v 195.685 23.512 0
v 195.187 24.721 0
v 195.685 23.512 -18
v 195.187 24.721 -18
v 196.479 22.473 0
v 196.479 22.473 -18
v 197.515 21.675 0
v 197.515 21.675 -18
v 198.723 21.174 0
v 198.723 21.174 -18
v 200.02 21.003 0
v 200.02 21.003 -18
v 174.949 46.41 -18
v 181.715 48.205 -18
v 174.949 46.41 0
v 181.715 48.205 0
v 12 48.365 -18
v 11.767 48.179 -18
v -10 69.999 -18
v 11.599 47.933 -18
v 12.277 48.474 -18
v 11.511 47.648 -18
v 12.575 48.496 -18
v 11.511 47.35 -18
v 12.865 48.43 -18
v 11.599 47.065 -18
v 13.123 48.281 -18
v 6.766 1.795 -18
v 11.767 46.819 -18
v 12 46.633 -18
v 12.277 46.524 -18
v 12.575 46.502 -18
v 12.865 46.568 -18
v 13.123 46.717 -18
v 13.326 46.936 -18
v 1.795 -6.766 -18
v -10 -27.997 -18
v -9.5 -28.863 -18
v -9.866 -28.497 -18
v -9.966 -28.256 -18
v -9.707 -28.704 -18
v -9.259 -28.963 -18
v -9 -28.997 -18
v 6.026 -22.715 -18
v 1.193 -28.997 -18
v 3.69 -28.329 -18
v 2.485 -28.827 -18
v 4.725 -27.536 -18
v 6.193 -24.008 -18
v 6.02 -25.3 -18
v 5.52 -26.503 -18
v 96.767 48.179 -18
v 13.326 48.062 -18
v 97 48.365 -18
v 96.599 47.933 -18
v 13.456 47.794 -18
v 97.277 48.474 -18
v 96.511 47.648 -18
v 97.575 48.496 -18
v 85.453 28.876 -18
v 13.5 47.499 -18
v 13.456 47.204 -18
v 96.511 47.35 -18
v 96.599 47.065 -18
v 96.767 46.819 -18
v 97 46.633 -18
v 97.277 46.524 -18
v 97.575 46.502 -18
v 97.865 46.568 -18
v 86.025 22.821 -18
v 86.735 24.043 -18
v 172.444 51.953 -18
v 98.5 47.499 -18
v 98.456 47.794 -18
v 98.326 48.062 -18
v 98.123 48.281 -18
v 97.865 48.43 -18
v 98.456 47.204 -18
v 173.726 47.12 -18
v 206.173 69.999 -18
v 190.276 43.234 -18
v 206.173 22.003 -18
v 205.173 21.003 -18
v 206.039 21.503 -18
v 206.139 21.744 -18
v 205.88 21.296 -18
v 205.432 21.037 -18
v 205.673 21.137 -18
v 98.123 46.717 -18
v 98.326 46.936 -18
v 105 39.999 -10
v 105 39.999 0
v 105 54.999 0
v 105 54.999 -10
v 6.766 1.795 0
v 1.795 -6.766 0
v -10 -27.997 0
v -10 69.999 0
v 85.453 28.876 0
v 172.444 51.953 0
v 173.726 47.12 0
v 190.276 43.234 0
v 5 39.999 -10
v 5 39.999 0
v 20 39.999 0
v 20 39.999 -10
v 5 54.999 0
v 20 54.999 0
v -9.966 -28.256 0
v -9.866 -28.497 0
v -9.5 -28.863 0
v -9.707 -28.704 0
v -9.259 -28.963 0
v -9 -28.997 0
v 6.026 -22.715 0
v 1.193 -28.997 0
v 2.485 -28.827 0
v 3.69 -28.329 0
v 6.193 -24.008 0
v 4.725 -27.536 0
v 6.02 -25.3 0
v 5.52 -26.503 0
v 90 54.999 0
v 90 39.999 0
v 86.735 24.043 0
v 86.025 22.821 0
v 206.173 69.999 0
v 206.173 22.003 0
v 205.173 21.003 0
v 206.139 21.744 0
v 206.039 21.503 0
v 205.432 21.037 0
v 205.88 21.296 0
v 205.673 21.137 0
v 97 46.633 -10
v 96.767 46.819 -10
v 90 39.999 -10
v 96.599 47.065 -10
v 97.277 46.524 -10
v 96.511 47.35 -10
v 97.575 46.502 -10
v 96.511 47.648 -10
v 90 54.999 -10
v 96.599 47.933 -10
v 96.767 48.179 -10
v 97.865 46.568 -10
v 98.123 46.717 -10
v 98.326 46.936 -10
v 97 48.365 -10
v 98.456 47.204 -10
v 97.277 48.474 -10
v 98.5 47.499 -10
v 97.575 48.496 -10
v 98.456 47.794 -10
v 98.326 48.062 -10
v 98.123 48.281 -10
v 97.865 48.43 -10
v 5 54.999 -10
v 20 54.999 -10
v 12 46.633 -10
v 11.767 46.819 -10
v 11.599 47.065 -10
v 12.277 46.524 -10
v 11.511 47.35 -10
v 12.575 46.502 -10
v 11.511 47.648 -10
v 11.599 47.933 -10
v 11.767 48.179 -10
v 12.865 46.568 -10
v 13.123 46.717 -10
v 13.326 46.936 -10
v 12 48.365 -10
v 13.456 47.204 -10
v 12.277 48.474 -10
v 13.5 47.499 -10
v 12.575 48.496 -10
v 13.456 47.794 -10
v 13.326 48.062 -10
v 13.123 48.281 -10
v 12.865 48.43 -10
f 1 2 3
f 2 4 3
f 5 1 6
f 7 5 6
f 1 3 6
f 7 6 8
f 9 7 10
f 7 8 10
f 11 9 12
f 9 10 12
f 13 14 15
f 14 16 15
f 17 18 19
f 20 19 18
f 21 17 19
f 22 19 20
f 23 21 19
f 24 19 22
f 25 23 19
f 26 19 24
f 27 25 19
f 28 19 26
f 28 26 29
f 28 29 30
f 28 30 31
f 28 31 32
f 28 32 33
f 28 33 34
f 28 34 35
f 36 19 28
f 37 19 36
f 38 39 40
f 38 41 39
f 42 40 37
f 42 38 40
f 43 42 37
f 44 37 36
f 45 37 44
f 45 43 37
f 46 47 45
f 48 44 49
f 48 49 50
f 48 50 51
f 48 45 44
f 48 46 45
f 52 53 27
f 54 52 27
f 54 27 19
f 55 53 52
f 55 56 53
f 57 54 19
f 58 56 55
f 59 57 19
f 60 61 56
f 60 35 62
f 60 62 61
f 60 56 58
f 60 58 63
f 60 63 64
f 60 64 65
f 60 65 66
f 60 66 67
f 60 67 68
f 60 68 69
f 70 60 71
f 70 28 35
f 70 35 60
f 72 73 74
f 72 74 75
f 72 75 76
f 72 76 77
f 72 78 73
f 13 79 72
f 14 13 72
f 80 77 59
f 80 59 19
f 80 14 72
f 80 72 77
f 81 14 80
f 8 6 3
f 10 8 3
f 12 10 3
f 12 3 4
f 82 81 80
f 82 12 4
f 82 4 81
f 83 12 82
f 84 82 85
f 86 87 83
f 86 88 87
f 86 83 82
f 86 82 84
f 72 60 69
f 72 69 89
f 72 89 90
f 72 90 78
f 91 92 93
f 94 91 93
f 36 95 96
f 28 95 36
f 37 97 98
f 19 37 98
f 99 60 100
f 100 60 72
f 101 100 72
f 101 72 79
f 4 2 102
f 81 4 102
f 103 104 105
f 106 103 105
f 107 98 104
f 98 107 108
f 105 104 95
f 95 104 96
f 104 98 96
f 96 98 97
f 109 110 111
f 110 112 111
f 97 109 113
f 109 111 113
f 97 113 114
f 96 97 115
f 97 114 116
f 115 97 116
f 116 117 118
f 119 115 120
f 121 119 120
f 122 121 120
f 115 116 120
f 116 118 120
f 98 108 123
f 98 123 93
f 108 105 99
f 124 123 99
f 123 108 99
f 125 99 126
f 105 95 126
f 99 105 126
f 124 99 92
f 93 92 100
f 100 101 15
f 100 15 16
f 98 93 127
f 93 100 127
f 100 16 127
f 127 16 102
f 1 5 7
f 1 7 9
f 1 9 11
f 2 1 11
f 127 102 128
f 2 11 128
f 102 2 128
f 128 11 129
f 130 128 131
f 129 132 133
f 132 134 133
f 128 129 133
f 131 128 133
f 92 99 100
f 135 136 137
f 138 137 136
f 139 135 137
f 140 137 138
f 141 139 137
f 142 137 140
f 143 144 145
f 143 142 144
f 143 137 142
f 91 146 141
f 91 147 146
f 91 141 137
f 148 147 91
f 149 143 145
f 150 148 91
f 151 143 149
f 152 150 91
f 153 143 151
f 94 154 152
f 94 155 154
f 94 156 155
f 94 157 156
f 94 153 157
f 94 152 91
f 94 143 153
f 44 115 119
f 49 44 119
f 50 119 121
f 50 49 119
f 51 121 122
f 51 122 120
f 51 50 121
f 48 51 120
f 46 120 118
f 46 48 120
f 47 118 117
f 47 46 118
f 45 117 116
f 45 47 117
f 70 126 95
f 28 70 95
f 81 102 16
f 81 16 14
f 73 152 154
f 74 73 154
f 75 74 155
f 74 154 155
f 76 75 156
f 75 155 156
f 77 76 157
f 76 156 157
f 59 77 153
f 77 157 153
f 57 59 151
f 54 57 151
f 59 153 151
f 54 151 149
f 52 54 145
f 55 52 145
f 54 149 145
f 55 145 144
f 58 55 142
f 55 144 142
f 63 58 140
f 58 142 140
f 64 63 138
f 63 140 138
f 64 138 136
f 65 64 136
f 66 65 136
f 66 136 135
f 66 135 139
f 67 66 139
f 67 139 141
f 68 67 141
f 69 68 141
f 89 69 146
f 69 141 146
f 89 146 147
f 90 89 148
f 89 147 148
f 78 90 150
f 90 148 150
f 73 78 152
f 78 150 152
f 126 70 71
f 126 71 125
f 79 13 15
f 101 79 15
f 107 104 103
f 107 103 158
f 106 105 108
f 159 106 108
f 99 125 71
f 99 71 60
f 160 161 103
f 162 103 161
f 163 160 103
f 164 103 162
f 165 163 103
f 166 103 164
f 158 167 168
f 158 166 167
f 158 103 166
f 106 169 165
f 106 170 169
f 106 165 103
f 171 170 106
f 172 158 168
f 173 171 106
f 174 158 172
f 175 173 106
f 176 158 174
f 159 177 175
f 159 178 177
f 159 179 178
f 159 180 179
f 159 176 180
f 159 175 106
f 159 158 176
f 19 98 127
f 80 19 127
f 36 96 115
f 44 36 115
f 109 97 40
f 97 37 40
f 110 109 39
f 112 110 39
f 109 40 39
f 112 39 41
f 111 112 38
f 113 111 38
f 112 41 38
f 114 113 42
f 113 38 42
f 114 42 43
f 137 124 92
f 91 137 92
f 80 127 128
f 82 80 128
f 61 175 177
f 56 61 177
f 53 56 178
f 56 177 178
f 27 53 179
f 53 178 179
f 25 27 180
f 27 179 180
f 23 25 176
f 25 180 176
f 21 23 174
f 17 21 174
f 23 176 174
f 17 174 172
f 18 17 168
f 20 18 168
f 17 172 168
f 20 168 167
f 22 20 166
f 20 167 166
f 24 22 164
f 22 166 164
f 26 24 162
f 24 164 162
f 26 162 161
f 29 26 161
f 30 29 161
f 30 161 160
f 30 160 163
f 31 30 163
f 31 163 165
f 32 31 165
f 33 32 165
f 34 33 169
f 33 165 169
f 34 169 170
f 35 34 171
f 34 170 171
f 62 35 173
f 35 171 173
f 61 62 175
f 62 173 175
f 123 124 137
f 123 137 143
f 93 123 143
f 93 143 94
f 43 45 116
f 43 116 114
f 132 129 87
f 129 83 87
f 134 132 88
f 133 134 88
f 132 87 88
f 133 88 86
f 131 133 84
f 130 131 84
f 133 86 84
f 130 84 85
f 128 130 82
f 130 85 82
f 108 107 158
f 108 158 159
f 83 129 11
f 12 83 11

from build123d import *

# Parameters (mm, degrees)
PAD_DEPTH       = 18
FILLET_R        = 5
FILLET001_R     = 5
FILLET002_R     = 1
FILLET003_R     = 1
CHAMFER_SIZE    = 7
CHAMFER001_SIZE = 7
SKETCH001_W     = 15
SKETCH001_H     = 15
POCKET_DEPTH    = 10
SKETCH005_R     = 1
POCKET001_DEPTH = 8
SKETCH006_R     = 1
POCKET002_DEPTH = 8
POCKET003_DEPTH = 18
CHAMFER002_SIZE = 1
CHAMFER003_SIZE = 1


with BuildPart() as part:
    # Sketch → Pad (new body)
    with BuildSketch(Plane(origin=(0, 0, 0), x_dir=(1, 0, 0), z_dir=(0, 0, -1))):
        Polygon((206.173076, -21.002959), (196.173076, -21.002959), (188.480768, -50), (0, 0), (7.692308, 28.997041), (-10, 28.997041), (-10, -69.999032), (206.173076, -69.999032), align=None)
    extrude(amount=PAD_DEPTH)

    # Fillet
    fillet_edges = [part.edges().sort_by_distance(p)[0] for p in [
        (7.692308, -28.997041, -9),
    ]]
    fillet(fillet_edges, radius=FILLET_R)

    # Fillet001
    fillet001_edges = [part.edges().sort_by_distance(p)[0] for p in [
        (196.173076, 21.002959, -9),
    ]]
    fillet(fillet001_edges, radius=FILLET001_R)

    # Fillet002
    fillet002_edges = [part.edges().sort_by_distance(p)[0] for p in [
        (206.173076, 21.002959, -9),
    ]]
    fillet(fillet002_edges, radius=FILLET002_R)

    # Fillet003
    fillet003_edges = [part.edges().sort_by_distance(p)[0] for p in [
        (-10, -28.997041, -9),
    ]]
    fillet(fillet003_edges, radius=FILLET003_R)

    # Chamfer
    chamfer_edges = [part.edges().sort_by_distance(p)[0] for p in [
        (0, 0, -9),
    ]]
    chamfer(chamfer_edges, length=CHAMFER_SIZE)

    # Chamfer001
    chamfer001_edges = [part.edges().sort_by_distance(p)[0] for p in [
        (188.480768, 50, -9),
    ]]
    chamfer(chamfer001_edges, length=CHAMFER001_SIZE)

    # Sketch001 → Pocket (cut)
    with BuildSketch(Plane.XY):
        with Locations((12.5, 47.499032)):
            Rectangle(SKETCH001_W, SKETCH001_H)
        with Locations((97.5, 47.499032)):
            Rectangle(SKETCH001_W, SKETCH001_H)
    extrude(amount=-POCKET_DEPTH, mode=Mode.SUBTRACT)

    # Sketch005 → Pocket001 (cut)
    with BuildSketch(Plane.XY.offset(-10)):
        with Locations((12.5, 47.499032)):
            Circle(SKETCH005_R)
    extrude(amount=-POCKET001_DEPTH, mode=Mode.SUBTRACT)

    # Sketch006 → Pocket002 (cut)
    with BuildSketch(Plane.XY.offset(-10)):
        with Locations((97.5, 47.499032)):
            Circle(SKETCH006_R)
    extrude(amount=-POCKET002_DEPTH, mode=Mode.SUBTRACT)

    # Sketch004 → Pocket003 (cut)
    with BuildSketch(Plane(origin=(0, 0, -18), x_dir=(1, 0, 0), z_dir=(0, 0, -1))):
        Polygon((85.452662, -28.876331), (172.443786, -51.953254), (173.982248, -46.153846), (86.991124, -23.076923), align=None)
    extrude(amount=-POCKET003_DEPTH, mode=Mode.SUBTRACT)

    # Chamfer002
    chamfer002_edges = [part.edges().sort_by_distance(p)[0] for p in [
        (86.991124, 23.076923, -9),
    ]]
    chamfer(chamfer002_edges, length=CHAMFER002_SIZE)

    # Chamfer003
    chamfer003_edges = [part.edges().sort_by_distance(p)[0] for p in [
        (173.982248, 46.153846, -9),
    ]]
    chamfer(chamfer003_edges, length=CHAMFER003_SIZE)


solid = part.part
